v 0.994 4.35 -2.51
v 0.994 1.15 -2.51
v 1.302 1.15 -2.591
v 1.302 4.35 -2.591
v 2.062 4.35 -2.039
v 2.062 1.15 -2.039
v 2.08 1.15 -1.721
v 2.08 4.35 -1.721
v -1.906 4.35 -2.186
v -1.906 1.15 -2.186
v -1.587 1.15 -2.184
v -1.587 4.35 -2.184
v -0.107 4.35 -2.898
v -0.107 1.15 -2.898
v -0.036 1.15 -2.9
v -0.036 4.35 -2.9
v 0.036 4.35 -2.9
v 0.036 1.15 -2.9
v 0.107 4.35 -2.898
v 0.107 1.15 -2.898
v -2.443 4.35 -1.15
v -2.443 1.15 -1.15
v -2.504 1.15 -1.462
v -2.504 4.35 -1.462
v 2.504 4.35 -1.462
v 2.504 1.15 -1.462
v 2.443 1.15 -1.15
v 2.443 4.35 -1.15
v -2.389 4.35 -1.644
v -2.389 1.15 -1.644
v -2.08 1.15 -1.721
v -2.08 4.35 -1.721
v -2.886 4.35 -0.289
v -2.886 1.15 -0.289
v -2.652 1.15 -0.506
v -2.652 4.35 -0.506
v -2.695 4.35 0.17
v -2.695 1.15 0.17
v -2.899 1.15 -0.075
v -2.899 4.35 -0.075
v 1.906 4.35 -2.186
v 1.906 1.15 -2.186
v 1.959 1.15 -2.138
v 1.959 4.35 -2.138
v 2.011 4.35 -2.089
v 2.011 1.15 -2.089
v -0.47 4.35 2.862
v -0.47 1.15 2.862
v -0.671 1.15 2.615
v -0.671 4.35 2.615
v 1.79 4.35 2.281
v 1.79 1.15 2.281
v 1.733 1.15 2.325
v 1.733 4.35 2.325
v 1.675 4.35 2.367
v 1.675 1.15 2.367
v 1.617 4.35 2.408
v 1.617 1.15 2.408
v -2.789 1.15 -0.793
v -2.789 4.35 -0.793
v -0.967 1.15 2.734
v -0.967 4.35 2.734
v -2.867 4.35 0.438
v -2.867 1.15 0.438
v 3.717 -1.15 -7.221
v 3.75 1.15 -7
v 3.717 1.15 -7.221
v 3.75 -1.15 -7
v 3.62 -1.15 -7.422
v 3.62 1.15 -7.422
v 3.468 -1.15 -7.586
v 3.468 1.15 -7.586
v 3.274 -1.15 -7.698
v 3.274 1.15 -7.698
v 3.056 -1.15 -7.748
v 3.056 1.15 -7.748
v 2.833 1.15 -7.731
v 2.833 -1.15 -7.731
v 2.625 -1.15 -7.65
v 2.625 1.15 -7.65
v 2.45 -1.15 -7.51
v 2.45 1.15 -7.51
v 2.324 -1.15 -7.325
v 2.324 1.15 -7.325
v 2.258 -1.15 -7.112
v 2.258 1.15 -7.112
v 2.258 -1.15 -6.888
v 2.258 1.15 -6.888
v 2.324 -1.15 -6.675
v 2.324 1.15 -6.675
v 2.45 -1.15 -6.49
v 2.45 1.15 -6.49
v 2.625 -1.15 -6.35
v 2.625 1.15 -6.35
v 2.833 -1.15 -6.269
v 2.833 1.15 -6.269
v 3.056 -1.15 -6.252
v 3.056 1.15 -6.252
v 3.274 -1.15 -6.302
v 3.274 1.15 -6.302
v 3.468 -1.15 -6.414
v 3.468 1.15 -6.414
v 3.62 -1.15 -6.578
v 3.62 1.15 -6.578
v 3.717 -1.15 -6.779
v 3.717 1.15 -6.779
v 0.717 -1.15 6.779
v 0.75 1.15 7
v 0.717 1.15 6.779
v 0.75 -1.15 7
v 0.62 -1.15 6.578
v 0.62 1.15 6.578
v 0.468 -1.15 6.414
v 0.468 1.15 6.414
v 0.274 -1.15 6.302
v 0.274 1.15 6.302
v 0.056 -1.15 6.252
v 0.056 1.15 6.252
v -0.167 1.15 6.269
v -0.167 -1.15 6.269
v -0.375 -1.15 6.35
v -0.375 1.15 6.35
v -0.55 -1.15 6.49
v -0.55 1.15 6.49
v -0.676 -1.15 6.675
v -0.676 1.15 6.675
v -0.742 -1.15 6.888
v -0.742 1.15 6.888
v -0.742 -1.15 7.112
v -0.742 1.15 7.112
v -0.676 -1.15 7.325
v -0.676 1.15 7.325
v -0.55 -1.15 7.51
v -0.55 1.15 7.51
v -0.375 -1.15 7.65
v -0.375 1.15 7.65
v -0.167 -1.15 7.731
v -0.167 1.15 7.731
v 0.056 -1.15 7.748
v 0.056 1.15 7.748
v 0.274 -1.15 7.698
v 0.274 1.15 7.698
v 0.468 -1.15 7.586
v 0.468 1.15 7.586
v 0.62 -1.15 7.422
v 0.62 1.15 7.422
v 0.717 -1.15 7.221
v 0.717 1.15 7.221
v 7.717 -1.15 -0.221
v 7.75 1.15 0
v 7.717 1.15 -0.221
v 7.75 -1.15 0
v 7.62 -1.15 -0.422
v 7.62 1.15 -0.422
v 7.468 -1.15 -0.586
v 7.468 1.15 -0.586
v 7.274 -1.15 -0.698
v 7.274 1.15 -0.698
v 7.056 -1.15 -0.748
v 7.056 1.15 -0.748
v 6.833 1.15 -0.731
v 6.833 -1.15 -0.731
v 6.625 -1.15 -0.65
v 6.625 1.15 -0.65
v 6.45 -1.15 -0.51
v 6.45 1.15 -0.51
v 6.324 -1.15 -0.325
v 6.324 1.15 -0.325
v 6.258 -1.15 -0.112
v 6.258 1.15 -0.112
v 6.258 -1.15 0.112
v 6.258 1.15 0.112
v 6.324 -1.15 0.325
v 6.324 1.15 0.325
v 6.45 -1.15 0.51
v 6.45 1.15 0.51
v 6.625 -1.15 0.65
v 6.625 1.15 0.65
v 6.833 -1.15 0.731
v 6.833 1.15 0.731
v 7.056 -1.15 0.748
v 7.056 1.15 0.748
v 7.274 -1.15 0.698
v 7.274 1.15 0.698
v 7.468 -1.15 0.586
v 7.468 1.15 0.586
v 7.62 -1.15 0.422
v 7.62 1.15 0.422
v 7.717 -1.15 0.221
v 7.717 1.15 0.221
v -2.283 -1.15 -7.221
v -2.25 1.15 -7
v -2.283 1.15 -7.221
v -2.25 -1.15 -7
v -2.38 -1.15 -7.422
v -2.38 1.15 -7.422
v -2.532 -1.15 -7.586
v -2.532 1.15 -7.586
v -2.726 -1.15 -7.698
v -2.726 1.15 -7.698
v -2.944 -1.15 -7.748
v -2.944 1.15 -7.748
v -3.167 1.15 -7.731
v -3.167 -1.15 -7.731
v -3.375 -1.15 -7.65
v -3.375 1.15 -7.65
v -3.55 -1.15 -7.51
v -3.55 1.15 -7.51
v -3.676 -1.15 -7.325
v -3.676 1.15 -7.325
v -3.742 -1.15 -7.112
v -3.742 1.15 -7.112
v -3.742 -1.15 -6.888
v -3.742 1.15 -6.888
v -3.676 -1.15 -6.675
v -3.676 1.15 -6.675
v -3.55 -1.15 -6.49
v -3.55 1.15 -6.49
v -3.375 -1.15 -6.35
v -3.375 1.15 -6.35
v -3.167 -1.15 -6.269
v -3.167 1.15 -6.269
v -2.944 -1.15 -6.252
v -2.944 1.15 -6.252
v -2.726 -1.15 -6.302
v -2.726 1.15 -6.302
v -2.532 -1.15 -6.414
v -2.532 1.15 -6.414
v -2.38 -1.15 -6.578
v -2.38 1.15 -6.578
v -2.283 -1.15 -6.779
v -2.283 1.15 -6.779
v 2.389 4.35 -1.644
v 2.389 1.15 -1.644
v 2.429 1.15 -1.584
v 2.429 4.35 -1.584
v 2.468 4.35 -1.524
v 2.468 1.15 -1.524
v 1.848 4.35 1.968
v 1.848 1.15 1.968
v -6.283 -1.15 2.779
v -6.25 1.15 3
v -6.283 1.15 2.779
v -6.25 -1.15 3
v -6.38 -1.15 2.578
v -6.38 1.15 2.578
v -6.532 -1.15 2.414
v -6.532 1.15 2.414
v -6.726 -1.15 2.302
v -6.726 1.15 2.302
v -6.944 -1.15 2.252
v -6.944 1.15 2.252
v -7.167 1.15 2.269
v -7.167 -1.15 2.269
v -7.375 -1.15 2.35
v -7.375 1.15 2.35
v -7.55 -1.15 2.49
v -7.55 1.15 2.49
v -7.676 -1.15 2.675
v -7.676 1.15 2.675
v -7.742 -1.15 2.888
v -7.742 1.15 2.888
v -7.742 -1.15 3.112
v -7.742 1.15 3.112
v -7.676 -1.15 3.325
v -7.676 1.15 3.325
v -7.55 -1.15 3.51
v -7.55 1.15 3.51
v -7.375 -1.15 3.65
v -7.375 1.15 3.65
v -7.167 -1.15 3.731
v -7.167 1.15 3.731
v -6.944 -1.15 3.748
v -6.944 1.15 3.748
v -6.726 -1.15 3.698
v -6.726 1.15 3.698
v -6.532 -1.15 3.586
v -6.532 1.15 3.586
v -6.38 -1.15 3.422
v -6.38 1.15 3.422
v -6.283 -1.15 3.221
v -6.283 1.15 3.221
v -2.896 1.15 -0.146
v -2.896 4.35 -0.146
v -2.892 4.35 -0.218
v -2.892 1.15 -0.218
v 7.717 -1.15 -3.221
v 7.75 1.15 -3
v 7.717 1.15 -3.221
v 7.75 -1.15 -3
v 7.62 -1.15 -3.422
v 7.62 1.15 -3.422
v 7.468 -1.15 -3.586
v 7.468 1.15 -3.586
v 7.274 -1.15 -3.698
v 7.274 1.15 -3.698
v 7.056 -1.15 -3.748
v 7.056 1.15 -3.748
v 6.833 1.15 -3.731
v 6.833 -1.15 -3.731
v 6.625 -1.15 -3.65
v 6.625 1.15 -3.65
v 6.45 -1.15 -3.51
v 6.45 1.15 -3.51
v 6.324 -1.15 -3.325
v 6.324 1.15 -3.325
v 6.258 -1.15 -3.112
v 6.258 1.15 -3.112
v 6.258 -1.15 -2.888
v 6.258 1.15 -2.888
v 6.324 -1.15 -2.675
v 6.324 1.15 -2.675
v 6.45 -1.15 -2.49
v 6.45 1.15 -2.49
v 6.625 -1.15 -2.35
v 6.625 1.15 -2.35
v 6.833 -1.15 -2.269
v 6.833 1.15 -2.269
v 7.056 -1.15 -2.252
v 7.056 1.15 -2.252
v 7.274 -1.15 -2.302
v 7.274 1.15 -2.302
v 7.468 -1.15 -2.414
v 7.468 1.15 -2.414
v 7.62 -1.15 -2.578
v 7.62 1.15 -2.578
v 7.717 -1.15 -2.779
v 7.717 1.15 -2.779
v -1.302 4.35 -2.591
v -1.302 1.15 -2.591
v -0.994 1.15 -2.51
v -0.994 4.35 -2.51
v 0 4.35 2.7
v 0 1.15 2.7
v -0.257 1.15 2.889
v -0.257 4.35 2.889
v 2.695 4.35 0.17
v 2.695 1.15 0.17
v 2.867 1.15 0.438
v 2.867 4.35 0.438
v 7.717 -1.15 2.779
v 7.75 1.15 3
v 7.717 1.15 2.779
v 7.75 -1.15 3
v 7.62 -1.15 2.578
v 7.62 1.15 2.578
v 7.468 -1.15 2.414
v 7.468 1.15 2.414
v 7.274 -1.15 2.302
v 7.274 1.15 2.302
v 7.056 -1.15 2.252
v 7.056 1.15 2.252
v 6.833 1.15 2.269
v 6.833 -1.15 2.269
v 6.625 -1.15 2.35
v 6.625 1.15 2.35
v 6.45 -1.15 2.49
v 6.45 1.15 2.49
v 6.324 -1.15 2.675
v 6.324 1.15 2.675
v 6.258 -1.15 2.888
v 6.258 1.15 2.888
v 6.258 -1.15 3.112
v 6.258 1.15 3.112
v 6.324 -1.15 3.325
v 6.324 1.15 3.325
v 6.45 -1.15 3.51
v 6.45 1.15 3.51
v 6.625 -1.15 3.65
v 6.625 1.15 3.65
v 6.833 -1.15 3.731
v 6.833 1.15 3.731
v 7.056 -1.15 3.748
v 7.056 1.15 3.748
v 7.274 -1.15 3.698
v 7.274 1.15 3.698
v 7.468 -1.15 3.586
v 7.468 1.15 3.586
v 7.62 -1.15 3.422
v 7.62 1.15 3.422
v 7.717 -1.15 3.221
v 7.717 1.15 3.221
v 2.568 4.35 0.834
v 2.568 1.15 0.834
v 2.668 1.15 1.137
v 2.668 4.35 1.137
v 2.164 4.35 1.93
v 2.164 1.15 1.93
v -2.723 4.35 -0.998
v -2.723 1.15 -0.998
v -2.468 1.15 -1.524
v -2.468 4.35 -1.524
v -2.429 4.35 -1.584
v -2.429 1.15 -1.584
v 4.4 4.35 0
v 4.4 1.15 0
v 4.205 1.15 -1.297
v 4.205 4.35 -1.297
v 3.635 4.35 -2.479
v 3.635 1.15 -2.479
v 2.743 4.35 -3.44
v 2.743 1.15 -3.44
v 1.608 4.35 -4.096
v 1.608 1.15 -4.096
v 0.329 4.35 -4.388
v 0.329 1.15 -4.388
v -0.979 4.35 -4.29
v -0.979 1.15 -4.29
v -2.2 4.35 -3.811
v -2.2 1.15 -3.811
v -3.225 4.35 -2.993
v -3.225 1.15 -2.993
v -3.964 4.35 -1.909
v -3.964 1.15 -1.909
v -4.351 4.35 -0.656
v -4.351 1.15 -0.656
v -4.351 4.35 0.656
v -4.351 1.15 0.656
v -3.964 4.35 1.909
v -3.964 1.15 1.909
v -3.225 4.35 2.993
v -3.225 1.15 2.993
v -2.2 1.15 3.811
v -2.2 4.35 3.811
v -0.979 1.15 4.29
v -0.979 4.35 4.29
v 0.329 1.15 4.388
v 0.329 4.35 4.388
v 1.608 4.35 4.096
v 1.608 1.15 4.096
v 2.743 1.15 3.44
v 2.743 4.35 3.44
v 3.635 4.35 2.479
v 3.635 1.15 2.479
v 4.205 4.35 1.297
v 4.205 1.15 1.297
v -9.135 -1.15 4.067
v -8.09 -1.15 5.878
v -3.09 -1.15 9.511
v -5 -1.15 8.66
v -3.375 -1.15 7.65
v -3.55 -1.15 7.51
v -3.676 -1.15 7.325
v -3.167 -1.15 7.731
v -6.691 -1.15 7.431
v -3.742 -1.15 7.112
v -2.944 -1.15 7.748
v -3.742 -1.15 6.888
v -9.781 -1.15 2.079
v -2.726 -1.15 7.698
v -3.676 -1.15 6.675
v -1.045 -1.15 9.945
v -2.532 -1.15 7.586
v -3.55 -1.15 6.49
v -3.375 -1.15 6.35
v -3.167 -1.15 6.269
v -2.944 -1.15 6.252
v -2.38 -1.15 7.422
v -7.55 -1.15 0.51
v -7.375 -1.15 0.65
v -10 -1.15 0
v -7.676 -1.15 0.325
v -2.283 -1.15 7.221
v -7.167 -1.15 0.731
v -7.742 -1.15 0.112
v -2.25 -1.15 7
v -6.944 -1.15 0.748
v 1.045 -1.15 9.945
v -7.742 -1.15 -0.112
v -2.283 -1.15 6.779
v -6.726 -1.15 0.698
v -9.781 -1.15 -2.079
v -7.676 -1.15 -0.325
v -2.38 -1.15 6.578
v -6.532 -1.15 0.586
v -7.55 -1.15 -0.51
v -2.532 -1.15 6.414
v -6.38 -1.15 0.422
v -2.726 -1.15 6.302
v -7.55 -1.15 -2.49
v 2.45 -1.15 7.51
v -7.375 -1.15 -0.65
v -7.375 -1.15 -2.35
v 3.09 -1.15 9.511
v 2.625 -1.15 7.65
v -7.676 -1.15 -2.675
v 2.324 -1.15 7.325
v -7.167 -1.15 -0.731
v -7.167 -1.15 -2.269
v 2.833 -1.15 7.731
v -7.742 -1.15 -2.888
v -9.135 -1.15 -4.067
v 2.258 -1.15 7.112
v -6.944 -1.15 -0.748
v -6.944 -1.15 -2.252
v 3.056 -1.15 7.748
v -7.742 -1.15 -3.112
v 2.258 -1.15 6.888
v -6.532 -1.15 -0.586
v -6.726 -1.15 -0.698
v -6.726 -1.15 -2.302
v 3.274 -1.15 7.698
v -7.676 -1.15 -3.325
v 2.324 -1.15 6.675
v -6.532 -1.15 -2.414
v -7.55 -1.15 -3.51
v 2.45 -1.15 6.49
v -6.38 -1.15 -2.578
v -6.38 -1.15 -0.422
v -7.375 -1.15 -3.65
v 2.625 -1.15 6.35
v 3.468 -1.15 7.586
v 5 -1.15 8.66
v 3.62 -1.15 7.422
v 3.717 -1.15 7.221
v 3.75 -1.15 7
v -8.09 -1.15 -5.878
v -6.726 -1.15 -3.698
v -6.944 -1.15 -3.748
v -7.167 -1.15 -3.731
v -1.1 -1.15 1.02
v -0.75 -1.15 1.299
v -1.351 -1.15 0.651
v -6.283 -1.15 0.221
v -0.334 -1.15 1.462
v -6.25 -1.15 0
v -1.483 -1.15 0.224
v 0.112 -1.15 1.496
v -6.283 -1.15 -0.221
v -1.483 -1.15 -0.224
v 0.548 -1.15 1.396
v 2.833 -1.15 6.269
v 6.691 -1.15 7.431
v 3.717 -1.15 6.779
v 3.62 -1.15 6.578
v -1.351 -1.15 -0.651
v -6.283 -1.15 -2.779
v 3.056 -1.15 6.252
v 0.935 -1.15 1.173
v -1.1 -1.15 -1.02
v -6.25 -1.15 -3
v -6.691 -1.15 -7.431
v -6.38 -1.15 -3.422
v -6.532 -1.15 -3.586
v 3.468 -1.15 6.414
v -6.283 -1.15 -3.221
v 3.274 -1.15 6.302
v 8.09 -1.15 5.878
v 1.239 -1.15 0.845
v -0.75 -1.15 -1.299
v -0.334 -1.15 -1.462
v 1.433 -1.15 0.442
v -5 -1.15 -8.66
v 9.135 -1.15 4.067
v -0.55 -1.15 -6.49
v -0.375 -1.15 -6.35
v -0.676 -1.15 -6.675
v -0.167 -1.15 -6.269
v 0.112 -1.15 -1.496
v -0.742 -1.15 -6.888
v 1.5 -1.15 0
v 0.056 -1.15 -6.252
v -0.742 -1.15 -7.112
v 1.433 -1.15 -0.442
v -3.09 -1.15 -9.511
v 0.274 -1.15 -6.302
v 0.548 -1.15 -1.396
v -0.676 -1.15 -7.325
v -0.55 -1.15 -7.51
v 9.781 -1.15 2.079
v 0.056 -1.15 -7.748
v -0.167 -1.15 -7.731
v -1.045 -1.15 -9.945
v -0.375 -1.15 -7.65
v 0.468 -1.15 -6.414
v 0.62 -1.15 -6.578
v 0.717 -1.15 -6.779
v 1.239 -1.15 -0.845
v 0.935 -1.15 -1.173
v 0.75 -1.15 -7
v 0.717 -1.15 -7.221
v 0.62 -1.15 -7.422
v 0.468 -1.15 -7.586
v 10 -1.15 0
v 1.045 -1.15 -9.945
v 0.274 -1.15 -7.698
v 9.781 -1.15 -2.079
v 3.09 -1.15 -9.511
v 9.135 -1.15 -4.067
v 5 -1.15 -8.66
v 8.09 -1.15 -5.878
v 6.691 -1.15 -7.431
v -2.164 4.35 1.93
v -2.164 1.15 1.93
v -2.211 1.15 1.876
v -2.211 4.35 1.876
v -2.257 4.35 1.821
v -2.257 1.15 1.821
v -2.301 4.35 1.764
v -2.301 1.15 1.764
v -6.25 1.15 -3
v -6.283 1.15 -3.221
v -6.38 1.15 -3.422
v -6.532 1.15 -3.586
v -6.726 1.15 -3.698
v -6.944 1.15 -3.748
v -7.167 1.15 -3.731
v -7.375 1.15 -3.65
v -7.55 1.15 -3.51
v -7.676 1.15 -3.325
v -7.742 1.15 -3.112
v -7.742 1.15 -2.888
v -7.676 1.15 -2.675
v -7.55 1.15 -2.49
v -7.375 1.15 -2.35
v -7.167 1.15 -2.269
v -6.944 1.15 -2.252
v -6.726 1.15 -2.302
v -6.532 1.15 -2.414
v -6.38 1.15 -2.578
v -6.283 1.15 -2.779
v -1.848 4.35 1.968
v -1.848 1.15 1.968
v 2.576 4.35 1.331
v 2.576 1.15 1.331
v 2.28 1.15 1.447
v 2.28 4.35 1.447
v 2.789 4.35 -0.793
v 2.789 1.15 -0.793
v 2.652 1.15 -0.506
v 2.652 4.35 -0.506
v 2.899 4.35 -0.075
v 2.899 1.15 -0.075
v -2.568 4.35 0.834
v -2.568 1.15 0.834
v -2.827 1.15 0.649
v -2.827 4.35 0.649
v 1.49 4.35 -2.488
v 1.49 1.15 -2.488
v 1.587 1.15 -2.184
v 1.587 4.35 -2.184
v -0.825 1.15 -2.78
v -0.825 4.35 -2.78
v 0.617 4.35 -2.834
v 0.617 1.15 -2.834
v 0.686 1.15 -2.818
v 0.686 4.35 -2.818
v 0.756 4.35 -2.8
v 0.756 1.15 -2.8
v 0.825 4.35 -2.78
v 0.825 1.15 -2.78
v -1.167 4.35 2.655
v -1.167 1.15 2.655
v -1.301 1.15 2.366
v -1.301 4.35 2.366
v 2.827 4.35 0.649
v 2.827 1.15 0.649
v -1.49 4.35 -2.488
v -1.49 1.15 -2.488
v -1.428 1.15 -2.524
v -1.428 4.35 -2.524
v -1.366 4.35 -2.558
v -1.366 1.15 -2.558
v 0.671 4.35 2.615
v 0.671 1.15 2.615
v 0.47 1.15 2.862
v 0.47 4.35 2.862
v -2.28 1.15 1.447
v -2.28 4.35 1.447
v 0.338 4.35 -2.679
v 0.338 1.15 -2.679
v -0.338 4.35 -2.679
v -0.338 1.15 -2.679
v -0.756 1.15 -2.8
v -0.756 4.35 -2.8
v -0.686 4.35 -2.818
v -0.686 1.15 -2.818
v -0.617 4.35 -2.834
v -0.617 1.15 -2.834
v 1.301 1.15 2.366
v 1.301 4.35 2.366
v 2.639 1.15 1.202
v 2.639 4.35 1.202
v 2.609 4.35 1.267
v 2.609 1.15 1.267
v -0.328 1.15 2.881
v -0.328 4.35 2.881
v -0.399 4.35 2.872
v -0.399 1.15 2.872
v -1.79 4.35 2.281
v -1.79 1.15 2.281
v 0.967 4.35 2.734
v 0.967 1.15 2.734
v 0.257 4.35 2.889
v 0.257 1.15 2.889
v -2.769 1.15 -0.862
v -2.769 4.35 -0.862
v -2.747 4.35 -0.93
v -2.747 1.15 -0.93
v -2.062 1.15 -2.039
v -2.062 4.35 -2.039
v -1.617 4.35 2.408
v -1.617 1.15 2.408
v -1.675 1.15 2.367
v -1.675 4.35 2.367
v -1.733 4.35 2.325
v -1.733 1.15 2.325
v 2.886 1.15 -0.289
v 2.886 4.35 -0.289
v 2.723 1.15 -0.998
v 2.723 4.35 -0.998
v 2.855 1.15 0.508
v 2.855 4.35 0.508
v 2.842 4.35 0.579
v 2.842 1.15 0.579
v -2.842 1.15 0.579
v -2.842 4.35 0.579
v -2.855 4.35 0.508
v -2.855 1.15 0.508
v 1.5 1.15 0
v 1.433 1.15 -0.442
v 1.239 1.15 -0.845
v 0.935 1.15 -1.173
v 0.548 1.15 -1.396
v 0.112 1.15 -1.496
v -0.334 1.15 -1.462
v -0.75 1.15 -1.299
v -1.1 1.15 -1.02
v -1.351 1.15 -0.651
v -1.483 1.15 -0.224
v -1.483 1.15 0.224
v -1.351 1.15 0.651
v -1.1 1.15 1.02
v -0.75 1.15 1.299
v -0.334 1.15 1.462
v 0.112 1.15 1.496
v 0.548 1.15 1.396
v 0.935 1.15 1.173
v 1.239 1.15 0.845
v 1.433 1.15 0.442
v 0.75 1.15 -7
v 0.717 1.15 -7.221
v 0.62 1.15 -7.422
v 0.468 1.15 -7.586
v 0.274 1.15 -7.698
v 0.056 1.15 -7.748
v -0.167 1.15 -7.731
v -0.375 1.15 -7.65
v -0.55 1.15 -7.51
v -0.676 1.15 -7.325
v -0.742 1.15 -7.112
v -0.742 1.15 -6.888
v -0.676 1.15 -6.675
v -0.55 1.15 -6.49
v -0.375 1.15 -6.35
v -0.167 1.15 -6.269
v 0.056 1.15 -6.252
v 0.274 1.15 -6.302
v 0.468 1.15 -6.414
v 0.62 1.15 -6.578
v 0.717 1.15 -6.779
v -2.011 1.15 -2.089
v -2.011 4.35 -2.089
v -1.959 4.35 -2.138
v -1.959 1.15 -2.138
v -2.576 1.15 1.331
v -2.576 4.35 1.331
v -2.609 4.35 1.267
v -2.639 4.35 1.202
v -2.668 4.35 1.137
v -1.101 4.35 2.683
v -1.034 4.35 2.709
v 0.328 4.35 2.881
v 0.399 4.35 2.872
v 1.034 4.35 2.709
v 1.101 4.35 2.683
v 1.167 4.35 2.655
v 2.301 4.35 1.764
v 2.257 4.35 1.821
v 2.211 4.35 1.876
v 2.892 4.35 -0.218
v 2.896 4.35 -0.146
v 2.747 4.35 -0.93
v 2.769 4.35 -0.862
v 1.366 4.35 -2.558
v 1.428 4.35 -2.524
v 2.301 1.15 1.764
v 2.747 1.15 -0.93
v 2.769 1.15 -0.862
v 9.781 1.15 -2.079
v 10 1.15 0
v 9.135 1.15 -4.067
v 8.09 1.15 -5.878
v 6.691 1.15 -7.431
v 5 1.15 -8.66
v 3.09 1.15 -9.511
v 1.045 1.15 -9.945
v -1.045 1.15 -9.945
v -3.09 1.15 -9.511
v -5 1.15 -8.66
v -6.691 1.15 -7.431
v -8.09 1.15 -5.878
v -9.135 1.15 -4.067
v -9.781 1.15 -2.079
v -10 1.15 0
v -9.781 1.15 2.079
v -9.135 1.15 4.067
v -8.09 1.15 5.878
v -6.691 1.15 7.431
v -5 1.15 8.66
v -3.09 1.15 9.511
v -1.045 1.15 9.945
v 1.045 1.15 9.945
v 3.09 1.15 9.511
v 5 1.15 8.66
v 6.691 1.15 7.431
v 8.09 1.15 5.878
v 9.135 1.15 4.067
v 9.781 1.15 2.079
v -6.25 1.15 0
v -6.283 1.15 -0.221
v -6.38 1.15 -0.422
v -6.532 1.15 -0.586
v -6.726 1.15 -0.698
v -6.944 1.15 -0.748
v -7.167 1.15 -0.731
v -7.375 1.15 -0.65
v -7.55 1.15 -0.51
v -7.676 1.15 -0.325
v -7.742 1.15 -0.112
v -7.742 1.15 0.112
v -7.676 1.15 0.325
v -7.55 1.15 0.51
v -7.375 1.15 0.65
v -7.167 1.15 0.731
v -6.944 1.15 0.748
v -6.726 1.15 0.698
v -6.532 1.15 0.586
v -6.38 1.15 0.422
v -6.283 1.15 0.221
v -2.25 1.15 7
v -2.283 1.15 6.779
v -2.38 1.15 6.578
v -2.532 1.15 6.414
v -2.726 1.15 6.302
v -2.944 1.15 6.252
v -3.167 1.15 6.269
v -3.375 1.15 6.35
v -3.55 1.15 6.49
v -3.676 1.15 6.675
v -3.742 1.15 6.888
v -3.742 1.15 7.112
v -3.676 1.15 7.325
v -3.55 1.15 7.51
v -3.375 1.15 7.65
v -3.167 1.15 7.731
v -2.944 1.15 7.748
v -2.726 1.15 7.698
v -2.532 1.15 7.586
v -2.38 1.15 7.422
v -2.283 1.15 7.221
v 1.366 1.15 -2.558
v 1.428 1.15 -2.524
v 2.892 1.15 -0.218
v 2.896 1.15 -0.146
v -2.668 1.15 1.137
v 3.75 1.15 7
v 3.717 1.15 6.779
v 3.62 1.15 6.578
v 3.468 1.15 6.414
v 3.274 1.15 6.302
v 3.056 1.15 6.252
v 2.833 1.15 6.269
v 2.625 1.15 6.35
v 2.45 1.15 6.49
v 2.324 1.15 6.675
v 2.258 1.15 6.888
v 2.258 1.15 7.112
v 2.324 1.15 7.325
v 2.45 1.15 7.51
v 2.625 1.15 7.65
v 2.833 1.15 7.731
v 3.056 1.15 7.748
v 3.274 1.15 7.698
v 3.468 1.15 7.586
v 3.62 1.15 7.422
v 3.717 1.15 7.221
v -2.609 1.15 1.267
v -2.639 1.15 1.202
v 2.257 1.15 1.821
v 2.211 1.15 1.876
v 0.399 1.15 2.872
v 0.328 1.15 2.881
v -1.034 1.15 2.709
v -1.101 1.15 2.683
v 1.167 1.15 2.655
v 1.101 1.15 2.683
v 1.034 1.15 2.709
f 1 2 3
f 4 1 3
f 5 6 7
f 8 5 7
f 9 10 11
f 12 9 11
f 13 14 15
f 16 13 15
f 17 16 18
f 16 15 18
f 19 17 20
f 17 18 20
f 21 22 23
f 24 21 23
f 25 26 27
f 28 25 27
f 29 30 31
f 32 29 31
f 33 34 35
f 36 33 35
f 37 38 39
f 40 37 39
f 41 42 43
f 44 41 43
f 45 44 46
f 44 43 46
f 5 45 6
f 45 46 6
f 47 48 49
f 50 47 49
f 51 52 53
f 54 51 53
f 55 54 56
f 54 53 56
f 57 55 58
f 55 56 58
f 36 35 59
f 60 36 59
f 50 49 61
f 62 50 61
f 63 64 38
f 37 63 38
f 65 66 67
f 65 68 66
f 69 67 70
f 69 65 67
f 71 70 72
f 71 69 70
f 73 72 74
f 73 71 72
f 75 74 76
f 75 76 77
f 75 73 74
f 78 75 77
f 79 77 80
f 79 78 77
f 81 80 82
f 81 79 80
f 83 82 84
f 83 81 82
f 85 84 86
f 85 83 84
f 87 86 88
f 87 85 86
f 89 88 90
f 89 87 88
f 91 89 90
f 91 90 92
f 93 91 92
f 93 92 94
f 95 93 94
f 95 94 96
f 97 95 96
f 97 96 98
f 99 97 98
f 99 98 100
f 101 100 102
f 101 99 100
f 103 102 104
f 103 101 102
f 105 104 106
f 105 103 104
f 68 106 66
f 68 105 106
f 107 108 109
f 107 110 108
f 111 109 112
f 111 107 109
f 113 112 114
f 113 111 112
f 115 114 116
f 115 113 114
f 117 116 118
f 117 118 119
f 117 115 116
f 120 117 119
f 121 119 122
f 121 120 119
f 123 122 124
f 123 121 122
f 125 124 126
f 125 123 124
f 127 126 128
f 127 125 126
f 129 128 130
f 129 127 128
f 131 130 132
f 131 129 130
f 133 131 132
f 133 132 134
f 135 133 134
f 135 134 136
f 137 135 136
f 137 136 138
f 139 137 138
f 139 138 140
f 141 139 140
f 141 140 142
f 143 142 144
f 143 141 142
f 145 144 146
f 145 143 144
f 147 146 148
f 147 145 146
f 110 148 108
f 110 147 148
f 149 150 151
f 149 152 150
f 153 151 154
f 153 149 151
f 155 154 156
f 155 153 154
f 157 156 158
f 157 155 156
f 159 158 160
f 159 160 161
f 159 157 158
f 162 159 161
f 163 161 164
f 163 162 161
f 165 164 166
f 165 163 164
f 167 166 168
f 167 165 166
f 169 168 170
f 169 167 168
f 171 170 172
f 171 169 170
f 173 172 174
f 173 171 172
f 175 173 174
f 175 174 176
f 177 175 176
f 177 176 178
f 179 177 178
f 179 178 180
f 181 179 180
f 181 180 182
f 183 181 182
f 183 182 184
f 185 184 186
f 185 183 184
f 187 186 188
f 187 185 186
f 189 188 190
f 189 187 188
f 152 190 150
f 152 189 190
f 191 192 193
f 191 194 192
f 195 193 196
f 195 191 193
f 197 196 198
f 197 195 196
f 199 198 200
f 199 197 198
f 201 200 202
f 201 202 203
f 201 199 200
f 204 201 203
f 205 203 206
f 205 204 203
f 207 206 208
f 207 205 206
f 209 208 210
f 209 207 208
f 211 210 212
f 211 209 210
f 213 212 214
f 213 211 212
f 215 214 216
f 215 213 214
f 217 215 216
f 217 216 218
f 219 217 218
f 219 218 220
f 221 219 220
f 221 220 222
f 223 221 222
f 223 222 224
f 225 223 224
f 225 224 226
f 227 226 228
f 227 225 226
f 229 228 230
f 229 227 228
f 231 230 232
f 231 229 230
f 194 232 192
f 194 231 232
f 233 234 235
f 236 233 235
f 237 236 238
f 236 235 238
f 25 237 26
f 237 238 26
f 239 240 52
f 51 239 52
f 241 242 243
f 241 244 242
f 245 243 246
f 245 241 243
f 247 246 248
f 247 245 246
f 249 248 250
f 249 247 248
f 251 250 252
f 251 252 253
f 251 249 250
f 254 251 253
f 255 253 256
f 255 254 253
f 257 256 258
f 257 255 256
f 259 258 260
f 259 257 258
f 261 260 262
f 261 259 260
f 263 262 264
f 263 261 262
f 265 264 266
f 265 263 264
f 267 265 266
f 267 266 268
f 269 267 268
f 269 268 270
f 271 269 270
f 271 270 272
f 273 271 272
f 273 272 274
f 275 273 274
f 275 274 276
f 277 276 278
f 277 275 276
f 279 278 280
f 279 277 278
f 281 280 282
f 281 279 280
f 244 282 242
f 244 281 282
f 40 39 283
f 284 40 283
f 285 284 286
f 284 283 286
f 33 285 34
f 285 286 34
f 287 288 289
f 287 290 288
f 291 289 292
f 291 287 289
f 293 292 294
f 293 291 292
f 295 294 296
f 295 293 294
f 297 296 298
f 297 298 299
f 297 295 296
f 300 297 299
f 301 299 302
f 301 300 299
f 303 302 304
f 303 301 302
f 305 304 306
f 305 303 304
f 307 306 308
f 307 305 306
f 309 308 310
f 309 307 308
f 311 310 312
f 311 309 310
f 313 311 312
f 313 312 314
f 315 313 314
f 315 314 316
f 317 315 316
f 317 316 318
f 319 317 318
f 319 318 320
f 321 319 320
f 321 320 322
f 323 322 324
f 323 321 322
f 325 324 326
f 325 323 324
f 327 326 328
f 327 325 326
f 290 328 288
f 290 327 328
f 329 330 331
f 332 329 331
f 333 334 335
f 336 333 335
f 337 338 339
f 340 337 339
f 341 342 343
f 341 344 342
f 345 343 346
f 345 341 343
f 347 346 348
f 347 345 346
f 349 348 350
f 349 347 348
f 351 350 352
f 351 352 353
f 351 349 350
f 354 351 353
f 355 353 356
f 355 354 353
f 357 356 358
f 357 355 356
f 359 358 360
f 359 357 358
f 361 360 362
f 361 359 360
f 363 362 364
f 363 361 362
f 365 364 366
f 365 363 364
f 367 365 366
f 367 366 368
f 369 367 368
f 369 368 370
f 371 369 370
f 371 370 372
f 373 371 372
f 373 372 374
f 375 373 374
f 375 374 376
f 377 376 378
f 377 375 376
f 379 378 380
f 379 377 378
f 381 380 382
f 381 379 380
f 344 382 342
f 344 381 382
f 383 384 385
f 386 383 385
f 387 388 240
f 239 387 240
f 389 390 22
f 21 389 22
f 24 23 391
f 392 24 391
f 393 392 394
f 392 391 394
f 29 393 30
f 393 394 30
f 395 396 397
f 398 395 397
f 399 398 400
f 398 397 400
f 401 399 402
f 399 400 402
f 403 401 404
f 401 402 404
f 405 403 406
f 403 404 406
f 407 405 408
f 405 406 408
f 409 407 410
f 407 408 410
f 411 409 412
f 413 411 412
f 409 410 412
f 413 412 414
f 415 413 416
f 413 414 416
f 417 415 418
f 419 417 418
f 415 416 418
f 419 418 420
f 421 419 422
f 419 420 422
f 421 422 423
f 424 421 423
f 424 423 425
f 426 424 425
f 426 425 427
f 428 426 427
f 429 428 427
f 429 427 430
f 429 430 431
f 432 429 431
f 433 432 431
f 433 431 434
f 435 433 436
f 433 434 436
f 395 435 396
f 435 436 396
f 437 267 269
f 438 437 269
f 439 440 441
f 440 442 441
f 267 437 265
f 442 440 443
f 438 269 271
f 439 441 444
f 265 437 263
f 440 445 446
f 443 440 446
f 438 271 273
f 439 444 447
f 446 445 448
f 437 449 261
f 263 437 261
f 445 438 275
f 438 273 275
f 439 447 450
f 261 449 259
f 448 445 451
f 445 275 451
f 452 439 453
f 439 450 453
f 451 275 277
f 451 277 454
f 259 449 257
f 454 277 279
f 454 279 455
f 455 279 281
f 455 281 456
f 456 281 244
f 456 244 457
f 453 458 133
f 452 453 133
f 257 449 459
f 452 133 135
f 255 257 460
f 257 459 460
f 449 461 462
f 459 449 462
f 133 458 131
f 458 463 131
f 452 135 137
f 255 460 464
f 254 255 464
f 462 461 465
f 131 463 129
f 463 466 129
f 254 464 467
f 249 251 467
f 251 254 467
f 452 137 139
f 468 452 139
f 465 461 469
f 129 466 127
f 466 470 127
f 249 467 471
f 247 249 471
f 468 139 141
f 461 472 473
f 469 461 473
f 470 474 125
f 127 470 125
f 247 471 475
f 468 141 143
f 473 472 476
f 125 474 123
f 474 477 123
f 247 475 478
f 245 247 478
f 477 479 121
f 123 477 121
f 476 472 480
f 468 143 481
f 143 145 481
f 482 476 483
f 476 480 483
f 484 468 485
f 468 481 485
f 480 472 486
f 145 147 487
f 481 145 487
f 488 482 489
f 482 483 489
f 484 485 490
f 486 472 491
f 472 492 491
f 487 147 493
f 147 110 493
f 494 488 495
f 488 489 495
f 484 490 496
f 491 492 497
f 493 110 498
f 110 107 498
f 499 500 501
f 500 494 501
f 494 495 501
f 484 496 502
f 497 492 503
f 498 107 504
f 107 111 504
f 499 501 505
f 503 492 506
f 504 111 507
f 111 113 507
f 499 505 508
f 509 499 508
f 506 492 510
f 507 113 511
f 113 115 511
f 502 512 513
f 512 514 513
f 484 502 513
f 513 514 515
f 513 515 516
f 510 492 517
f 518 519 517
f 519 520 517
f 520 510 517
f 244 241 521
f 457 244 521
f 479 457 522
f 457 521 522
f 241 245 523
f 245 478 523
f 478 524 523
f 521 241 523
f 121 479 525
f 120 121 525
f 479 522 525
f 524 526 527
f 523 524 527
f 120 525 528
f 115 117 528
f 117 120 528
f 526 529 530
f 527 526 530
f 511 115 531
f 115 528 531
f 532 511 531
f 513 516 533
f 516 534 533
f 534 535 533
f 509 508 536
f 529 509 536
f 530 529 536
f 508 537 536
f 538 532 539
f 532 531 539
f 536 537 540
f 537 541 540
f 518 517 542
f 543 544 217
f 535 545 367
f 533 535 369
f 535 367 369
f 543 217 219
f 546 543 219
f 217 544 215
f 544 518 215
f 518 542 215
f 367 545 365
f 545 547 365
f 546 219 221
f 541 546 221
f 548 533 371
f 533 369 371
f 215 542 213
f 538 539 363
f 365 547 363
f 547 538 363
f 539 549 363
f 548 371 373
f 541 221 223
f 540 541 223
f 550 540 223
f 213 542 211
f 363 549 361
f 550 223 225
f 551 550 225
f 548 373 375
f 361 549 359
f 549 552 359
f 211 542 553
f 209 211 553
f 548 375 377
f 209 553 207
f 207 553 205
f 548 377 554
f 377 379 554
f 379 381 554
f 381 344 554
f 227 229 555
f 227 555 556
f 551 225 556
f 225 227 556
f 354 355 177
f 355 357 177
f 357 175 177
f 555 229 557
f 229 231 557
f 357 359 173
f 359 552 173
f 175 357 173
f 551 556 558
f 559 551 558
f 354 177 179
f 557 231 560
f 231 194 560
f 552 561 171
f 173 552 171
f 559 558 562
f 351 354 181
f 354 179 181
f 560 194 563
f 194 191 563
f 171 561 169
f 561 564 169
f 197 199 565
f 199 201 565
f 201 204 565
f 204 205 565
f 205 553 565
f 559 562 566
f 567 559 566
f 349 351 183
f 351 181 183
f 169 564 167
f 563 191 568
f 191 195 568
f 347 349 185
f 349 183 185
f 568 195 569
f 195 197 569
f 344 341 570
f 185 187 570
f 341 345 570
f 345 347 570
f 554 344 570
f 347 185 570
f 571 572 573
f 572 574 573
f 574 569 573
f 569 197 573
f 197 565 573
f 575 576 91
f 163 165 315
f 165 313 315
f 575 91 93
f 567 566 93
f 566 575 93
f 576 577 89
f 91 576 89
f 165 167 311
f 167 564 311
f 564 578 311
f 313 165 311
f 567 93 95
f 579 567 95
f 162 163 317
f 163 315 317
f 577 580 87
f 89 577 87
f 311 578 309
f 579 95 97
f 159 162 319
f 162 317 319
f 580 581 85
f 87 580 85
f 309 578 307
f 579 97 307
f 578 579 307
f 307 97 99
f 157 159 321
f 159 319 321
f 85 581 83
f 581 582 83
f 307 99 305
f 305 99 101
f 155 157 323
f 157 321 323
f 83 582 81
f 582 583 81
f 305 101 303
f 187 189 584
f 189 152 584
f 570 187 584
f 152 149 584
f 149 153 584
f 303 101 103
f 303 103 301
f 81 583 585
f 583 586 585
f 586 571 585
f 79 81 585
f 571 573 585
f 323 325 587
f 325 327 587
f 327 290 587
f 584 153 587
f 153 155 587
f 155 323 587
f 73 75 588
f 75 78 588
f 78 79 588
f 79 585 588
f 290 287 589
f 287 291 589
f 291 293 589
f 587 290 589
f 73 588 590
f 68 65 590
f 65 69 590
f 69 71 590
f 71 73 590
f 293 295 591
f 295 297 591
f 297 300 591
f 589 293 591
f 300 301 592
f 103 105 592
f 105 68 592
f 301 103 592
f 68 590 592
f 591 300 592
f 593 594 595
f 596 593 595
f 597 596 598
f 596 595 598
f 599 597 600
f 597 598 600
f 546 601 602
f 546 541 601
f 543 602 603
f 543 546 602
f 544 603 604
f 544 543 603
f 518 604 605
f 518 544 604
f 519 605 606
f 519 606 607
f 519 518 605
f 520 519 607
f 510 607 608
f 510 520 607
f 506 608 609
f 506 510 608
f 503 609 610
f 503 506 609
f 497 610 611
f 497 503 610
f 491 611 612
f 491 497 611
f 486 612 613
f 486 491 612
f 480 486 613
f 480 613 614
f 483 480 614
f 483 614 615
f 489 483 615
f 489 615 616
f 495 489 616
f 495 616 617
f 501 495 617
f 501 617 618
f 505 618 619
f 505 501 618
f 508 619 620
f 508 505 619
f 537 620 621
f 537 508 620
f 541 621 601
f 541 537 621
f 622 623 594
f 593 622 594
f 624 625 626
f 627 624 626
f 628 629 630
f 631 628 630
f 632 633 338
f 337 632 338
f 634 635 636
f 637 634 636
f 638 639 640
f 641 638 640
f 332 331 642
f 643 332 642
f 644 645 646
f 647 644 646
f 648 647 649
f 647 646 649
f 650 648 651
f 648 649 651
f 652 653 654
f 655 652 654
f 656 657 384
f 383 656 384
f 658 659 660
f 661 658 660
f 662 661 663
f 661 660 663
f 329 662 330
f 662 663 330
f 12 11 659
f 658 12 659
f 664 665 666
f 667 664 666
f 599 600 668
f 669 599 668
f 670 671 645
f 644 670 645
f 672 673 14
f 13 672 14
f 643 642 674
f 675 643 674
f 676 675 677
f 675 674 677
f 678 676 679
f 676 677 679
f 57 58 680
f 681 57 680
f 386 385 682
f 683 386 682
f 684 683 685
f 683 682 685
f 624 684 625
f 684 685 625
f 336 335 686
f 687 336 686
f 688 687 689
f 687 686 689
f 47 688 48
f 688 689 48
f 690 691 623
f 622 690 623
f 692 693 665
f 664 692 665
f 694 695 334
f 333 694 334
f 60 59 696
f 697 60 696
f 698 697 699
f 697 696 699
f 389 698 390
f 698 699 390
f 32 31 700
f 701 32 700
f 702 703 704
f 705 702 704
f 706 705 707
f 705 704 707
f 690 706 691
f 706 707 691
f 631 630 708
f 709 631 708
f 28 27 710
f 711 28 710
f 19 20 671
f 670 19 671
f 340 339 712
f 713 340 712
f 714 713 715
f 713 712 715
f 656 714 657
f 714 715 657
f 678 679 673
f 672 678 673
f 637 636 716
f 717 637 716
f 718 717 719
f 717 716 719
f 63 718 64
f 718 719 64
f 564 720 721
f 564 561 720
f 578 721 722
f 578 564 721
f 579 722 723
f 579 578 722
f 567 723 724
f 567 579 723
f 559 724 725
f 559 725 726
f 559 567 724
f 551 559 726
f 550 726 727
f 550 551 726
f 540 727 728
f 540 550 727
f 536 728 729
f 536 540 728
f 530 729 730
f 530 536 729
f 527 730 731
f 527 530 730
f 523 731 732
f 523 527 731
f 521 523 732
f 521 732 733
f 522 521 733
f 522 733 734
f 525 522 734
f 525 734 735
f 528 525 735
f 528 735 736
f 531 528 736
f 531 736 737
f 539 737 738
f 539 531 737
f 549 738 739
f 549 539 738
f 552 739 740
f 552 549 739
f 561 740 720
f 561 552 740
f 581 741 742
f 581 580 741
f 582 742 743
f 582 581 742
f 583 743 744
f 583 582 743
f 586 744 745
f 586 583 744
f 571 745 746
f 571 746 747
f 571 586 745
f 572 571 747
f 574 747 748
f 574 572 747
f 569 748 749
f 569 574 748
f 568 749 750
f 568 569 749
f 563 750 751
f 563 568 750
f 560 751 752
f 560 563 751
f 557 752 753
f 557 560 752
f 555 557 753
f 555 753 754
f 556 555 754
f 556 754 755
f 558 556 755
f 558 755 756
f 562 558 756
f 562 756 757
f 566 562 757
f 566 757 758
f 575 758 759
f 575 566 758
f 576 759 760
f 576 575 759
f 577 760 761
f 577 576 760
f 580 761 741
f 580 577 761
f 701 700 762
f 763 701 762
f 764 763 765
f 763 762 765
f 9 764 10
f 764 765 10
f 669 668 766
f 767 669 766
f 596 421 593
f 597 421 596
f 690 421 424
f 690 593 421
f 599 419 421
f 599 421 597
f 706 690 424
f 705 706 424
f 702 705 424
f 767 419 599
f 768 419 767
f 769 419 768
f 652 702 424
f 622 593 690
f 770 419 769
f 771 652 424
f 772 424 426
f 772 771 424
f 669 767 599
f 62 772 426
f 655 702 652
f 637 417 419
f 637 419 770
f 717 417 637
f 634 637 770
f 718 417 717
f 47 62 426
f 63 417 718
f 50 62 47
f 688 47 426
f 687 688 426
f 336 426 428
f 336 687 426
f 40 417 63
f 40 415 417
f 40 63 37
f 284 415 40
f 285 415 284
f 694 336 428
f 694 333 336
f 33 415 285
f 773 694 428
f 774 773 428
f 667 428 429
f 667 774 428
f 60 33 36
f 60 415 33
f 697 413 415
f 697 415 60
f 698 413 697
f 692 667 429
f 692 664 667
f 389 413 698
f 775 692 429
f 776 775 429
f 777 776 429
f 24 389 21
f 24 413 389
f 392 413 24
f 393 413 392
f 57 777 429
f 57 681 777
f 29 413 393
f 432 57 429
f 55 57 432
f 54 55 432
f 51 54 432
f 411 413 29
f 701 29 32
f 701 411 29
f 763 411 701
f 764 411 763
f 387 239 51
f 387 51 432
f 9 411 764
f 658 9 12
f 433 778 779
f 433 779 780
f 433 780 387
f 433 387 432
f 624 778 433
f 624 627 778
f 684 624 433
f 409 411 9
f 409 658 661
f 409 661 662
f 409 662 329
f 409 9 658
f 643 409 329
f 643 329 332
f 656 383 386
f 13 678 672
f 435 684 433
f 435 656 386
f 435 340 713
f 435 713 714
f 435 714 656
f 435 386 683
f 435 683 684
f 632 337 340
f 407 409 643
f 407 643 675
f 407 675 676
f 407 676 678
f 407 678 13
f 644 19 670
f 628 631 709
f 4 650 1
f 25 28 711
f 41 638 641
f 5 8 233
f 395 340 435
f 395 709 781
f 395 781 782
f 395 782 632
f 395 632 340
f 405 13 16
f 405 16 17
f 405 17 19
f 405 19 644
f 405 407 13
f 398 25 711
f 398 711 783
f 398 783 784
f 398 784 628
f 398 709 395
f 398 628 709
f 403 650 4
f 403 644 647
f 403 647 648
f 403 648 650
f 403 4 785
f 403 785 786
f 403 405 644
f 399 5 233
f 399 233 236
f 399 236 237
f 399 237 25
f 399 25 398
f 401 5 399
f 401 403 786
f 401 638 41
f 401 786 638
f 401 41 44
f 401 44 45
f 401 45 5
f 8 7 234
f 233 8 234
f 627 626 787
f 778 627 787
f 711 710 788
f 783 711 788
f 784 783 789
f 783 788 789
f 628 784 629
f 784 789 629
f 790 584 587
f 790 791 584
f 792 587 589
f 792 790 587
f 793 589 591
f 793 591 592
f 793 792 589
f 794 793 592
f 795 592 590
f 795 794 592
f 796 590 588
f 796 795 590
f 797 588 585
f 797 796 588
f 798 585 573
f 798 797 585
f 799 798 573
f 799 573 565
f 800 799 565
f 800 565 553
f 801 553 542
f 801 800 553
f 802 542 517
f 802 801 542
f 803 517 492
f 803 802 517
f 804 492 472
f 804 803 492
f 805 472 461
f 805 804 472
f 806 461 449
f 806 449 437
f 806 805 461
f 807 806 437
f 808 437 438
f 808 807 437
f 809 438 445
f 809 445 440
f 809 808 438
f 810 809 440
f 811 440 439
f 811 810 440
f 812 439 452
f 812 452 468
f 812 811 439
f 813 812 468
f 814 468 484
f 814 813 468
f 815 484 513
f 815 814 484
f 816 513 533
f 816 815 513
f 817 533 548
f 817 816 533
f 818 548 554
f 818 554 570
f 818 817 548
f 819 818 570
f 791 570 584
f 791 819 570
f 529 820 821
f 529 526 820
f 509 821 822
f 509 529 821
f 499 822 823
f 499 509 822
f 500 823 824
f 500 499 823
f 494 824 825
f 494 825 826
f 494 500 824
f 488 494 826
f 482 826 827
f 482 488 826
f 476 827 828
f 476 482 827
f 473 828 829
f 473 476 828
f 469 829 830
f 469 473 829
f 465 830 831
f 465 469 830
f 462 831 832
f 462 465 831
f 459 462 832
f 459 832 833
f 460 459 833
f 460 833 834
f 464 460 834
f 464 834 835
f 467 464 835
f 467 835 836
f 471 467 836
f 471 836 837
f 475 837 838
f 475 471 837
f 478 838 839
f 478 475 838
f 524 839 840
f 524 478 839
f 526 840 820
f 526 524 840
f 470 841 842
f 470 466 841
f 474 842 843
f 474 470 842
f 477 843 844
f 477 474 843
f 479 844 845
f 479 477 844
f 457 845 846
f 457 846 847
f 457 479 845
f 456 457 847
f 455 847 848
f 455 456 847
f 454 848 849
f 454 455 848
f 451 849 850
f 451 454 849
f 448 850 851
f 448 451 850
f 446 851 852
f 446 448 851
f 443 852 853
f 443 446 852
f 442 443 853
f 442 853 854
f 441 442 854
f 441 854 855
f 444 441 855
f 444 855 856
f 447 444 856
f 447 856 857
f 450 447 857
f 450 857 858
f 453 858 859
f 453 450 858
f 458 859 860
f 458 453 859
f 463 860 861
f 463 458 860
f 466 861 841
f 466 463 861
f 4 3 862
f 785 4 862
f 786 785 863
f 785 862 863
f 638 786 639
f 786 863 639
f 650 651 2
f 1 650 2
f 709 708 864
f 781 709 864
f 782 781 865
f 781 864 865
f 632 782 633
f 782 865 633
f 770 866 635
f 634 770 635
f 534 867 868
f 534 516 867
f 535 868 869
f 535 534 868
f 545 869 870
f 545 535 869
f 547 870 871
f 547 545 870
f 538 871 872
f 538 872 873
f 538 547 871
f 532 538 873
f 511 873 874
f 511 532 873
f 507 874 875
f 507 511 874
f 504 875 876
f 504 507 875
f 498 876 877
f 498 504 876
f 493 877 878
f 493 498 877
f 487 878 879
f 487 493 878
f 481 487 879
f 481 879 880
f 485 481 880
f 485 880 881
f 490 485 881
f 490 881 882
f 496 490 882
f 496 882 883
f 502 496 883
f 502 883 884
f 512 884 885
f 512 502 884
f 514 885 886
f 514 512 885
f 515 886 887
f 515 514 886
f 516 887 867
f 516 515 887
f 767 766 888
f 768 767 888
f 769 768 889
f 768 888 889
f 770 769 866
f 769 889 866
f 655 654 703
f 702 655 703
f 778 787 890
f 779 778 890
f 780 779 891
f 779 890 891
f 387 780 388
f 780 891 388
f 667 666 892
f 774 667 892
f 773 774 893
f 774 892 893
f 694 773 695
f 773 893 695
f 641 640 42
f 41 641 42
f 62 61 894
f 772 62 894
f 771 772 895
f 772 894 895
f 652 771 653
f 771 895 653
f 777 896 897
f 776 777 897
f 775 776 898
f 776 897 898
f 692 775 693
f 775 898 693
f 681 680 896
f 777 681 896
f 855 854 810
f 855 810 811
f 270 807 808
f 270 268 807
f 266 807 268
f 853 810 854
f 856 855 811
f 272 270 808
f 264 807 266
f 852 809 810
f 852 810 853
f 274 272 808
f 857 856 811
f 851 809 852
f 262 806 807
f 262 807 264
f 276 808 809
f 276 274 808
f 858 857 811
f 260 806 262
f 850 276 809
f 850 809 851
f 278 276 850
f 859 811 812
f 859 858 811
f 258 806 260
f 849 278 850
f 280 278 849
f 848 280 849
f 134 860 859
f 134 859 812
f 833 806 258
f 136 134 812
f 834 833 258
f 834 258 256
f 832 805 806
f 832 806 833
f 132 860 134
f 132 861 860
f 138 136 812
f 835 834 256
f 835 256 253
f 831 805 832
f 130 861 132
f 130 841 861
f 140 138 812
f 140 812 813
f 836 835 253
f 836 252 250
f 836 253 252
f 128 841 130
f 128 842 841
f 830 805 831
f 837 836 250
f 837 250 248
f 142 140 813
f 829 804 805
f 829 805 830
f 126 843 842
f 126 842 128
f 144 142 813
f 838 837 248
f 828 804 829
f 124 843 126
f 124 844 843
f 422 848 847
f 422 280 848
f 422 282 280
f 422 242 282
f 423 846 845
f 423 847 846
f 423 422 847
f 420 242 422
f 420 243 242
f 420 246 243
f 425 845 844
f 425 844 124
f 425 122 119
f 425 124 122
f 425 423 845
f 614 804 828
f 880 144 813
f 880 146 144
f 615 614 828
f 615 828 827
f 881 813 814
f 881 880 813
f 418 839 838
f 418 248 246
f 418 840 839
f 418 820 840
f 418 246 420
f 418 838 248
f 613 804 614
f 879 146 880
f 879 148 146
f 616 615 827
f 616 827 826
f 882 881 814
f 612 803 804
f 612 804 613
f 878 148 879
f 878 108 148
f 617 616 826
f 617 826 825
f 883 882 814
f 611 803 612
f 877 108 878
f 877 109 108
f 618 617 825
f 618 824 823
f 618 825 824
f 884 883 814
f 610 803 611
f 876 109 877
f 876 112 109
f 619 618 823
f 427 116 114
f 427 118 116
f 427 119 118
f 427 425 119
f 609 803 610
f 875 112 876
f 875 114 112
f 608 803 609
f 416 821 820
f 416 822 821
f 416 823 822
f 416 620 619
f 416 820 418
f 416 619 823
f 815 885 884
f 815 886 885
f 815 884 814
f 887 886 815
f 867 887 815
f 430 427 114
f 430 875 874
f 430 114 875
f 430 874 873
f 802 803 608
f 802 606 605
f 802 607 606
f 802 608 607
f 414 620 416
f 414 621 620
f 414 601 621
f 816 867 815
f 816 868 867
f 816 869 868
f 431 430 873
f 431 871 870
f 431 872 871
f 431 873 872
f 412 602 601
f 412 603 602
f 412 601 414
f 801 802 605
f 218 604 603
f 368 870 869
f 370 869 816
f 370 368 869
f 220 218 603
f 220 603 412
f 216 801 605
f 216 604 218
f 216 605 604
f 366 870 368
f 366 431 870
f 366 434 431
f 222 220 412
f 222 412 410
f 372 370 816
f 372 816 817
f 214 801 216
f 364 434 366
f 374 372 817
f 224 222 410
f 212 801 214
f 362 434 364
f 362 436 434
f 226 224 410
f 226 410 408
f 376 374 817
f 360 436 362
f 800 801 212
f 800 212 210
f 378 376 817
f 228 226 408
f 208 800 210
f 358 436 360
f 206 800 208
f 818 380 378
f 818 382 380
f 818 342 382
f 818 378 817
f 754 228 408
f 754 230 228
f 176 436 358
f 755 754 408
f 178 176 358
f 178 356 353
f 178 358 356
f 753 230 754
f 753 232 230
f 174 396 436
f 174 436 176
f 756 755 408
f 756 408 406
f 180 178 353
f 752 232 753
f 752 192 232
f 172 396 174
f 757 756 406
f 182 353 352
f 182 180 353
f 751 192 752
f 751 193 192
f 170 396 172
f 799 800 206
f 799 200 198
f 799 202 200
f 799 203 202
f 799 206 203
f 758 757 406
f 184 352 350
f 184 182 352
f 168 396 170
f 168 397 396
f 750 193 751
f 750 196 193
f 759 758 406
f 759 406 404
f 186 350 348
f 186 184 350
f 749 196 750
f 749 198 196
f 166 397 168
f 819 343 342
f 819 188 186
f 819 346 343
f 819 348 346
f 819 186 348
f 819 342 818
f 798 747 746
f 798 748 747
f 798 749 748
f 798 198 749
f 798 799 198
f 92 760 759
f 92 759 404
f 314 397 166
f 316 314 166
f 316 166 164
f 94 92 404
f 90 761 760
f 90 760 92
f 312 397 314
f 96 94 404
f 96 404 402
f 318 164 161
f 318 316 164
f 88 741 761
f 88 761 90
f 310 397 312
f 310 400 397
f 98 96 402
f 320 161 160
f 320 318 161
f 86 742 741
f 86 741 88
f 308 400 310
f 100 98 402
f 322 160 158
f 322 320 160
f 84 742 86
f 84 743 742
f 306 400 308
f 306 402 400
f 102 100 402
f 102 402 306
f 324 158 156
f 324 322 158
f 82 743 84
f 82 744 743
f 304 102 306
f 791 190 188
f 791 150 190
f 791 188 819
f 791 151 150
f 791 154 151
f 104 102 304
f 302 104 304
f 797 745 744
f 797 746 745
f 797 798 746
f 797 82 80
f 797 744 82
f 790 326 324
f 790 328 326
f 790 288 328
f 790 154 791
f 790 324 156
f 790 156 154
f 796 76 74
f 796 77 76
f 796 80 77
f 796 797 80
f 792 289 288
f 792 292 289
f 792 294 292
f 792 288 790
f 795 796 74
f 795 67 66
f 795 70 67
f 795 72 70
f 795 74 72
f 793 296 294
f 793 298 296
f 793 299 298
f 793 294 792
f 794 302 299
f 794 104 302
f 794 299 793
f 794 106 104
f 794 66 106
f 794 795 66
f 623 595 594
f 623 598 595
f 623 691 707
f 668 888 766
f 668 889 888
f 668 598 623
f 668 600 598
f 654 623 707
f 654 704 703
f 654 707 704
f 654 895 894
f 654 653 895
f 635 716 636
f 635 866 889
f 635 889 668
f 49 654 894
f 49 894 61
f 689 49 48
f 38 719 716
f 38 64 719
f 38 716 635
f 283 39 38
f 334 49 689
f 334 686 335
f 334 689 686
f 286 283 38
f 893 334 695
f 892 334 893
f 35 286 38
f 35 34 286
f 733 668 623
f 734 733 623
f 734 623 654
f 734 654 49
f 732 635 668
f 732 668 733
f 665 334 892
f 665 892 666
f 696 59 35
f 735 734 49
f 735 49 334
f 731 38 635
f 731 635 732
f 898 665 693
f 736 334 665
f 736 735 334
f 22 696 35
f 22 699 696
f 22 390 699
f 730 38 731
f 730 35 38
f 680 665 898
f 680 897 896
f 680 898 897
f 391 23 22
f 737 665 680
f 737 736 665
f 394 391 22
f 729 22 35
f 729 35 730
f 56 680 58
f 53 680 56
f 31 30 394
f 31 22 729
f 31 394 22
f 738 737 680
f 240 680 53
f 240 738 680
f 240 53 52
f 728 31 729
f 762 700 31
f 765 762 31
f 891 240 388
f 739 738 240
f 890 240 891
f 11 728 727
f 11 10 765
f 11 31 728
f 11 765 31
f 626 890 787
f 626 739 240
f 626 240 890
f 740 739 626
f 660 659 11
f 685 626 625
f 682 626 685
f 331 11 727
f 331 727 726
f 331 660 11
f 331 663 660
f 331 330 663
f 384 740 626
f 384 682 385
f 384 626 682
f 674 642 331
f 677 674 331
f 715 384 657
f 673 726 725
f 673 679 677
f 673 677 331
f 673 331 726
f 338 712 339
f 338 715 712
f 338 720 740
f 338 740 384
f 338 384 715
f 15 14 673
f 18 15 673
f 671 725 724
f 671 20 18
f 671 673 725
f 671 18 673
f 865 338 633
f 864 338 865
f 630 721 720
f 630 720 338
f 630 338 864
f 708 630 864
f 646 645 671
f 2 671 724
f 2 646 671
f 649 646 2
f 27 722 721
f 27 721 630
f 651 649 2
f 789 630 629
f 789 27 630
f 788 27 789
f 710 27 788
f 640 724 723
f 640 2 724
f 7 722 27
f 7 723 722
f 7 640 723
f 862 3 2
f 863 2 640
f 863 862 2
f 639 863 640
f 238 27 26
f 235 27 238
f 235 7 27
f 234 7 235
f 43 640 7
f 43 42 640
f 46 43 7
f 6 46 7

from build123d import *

# Parameters (mm, degrees)
SKETCH2_R           = 6
SKETCH2_R_2         = 1.5
BOSS_EXTRUDE1_DEPTH = 1.15
SKETCH3_R           = 4.4
BOSS_EXTRUDE2_DEPTH = 3.2
SKETCH5_R           = 10
SKETCH5_R_2         = 0.75
SKETCH5_R_3         = 1.5
BOSS_EXTRUDE4_DEPTH = 1.15


with BuildPart() as part:
    # Sketch2 → Boss-Extrude1 (new body, symmetric)
    with BuildSketch(Plane(origin=(0, 0, 0), x_dir=(1, 0, 0), z_dir=(0, 1, 0))):
        Circle(SKETCH2_R)
        Circle(SKETCH2_R_2, mode=Mode.SUBTRACT)
    extrude(amount=BOSS_EXTRUDE1_DEPTH, both=True)

    # Sketch3 → Boss-Extrude2 (add)
    with BuildSketch(Plane(origin=(0, 1.15, 0), x_dir=(1, 0, 0), z_dir=(0, 1, 0))):
        Circle(SKETCH3_R)
        with BuildLine():
            Line((0.107421435, 2.898009771), (0.338399731, 2.678709694))
            Line((0.338399731, 2.678709694), (0.61665913, 2.83367809))
            ThreePointArc((0.61665913, 2.83367809), (0.721200673, 2.808891167), (0.824752316, 2.780248841))
            Line((0.824752316, 2.780248841), (0.993936292, 2.510396512))
            Line((0.993936292, 2.510396512), (1.301992734, 2.591295993))
            ThreePointArc((1.301992734, 2.591295993), (1.397085655, 2.541289372), (1.490260976, 2.48779465))
            Line((1.490260976, 2.48779465), (1.587020181, 2.184345885))
            Line((1.587020181, 2.184345885), (1.905517346, 2.186093238))
            ThreePointArc((1.905517346, 2.186093238), (1.985186607, 2.11400902), (2.062131058, 2.039023173))
            Line((2.062131058, 2.039023173), (2.080385755, 1.721044772))
            Line((2.080385755, 1.721044772), (2.389311295, 1.643530205))
            ThreePointArc((2.389311295, 1.643530205), (2.448550984, 1.553897705), (2.504429862, 1.46213237))
            Line((2.504429862, 1.46213237), (2.443033042, 1.149604087))
            Line((2.443033042, 1.149604087), (2.722976028, 0.997698125))
            ThreePointArc((2.722976028, 0.997698125), (2.758063897, 0.896149284), (2.789366126, 0.793370413))
            Line((2.789366126, 0.793370413), (2.652175577, 0.505929549))
            Line((2.652175577, 0.505929549), (2.885546163, 0.289177003))
            ThreePointArc((2.885546163, 0.289177003), (2.894277512, 0.182092507), (2.899036259, 0.074758075))
            Line((2.899036259, 0.074758075), (2.694672167, -0.169534403))
            Line((2.694672167, -0.169534403), (2.866806821, -0.437514174))
            ThreePointArc((2.866806821, -0.437514174), (2.848633027, -0.543405812), (2.826549281, -0.648551587))
            Line((2.826549281, -0.648551587), (2.567852594, -0.834345885))
            Line((2.567852594, -0.834345885), (2.667935462, -1.136714727))
            ThreePointArc((2.667935462, -1.136714727), (2.623998452, -1.234759946), (2.576459817, -1.331110368))
            Line((2.576459817, -1.331110368), (2.279685399, -1.446732346))
            Line((2.279685399, -1.446732346), (2.301427906, -1.764491312))
            ThreePointArc((2.301427906, -1.764491312), (2.234488404, -1.84852957), (2.164481907, -1.930030589))
            Line((2.164481907, -1.930030589), (1.848277186, -1.968215294))
            Line((1.848277186, -1.968215294), (1.790313171, -2.281398419))
            ThreePointArc((1.790313171, -2.281398419), (1.704577232, -2.346149284), (1.616501638, -2.40767989))
            Line((1.616501638, -2.40767989), (1.30073492, -2.366028036))
            Line((1.30073492, -2.366028036), (1.166706475, -2.654956874))
            ThreePointArc((1.166706475, -2.654956874), (1.067561203, -2.696351809), (0.966950626, -2.734045809))
            Line((0.966950626, -2.734045809), (0.671462695, -2.615174535))
            Line((0.671462695, -2.615174535), (0.469791321, -2.861694623))
            ThreePointArc((0.469791321, -2.861694623), (0.363466377, -2.877132634), (0.25664255, -2.888621575))
            Line((0.25664255, -2.888621575), (0, -2.7))
            Line((0, -2.7), (-0.25664255, -2.888621575))
            ThreePointArc((-0.25664255, -2.888621575), (-0.363466377, -2.877132634), (-0.469791321, -2.861694623))
            Line((-0.469791321, -2.861694623), (-0.671462695, -2.615174535))
            Line((-0.671462695, -2.615174535), (-0.966950626, -2.734045809))
            ThreePointArc((-0.966950626, -2.734045809), (-1.067561203, -2.696351809), (-1.166706475, -2.654956874))
            Line((-1.166706475, -2.654956874), (-1.30073492, -2.366028036))
            Line((-1.30073492, -2.366028036), (-1.616501638, -2.40767989))
            ThreePointArc((-1.616501638, -2.40767989), (-1.704577232, -2.346149284), (-1.790313171, -2.281398419))
            Line((-1.790313171, -2.281398419), (-1.848277186, -1.968215294))
            Line((-1.848277186, -1.968215294), (-2.164481907, -1.930030589))
            ThreePointArc((-2.164481907, -1.930030589), (-2.234488404, -1.84852957), (-2.301427906, -1.764491312))
            Line((-2.301427906, -1.764491312), (-2.279685399, -1.446732346))
            Line((-2.279685399, -1.446732346), (-2.576459817, -1.331110368))
            ThreePointArc((-2.576459817, -1.331110368), (-2.623998452, -1.234759946), (-2.667935462, -1.136714727))
            Line((-2.667935462, -1.136714727), (-2.567852594, -0.834345885))
            Line((-2.567852594, -0.834345885), (-2.826549281, -0.648551587))
            ThreePointArc((-2.826549281, -0.648551587), (-2.848633027, -0.543405812), (-2.866806821, -0.437514174))
            Line((-2.866806821, -0.437514174), (-2.694672167, -0.169534403))
            Line((-2.694672167, -0.169534403), (-2.899036259, 0.074758075))
            ThreePointArc((-2.899036259, 0.074758075), (-2.894277512, 0.182092507), (-2.885546163, 0.289177003))
            Line((-2.885546163, 0.289177003), (-2.652175577, 0.505929549))
            Line((-2.652175577, 0.505929549), (-2.789366126, 0.793370413))
            ThreePointArc((-2.789366126, 0.793370413), (-2.758063897, 0.896149284), (-2.722976028, 0.997698125))
            Line((-2.722976028, 0.997698125), (-2.443033042, 1.149604087))
            Line((-2.443033042, 1.149604087), (-2.504429862, 1.46213237))
            ThreePointArc((-2.504429862, 1.46213237), (-2.448550984, 1.553897705), (-2.389311295, 1.643530205))
            Line((-2.389311295, 1.643530205), (-2.080385755, 1.721044772))
            Line((-2.080385755, 1.721044772), (-2.062131058, 2.039023173))
            ThreePointArc((-2.062131058, 2.039023173), (-1.985186607, 2.11400902), (-1.905517346, 2.186093238))
            Line((-1.905517346, 2.186093238), (-1.587020181, 2.184345885))
            Line((-1.587020181, 2.184345885), (-1.490260976, 2.48779465))
            ThreePointArc((-1.490260976, 2.48779465), (-1.397085655, 2.541289372), (-1.301992734, 2.591295993))
            Line((-1.301992734, 2.591295993), (-0.993936292, 2.510396512))
            Line((-0.993936292, 2.510396512), (-0.824752316, 2.780248841))
            ThreePointArc((-0.824752316, 2.780248841), (-0.721200673, 2.808891167), (-0.61665913, 2.83367809))
            Line((-0.61665913, 2.83367809), (-0.338399731, 2.678709694))
            Line((-0.338399731, 2.678709694), (-0.107421435, 2.898009771))
            ThreePointArc((-0.107421435, 2.898009771), (0, 2.9), (0.107421435, 2.898009771))
        make_face(mode=Mode.SUBTRACT)
    extrude(amount=BOSS_EXTRUDE2_DEPTH)

    # Sketch5 → Boss-Extrude4 (add, symmetric)
    with BuildSketch(Plane(origin=(0, 0, 0), x_dir=(1, 0, 0), z_dir=(0, 1, 0))):
        Circle(SKETCH5_R)
        with Locations((0, 7)):
            Circle(SKETCH5_R_2, mode=Mode.SUBTRACT)
        with Locations((-3, 7)):
            Circle(SKETCH5_R_2, mode=Mode.SUBTRACT)
        with Locations((3, 7)):
            Circle(SKETCH5_R_2, mode=Mode.SUBTRACT)
        with Locations((7, 3)):
            Circle(SKETCH5_R_2, mode=Mode.SUBTRACT)
        with Locations((7, 0)):
            Circle(SKETCH5_R_2, mode=Mode.SUBTRACT)
        with Locations((7, -3)):
            Circle(SKETCH5_R_2, mode=Mode.SUBTRACT)
        with Locations((3, -7)):
            Circle(SKETCH5_R_2, mode=Mode.SUBTRACT)
        with Locations((0, -7)):
            Circle(SKETCH5_R_2, mode=Mode.SUBTRACT)
        with Locations((-3, -7)):
            Circle(SKETCH5_R_2, mode=Mode.SUBTRACT)
        with Locations((-7, -3)):
            Circle(SKETCH5_R_2, mode=Mode.SUBTRACT)
        with Locations((-7, 0)):
            Circle(SKETCH5_R_2, mode=Mode.SUBTRACT)
        with Locations((-7, 3)):
            Circle(SKETCH5_R_2, mode=Mode.SUBTRACT)
        Circle(SKETCH5_R_3, mode=Mode.SUBTRACT)
    extrude(amount=BOSS_EXTRUDE4_DEPTH, both=True)


solid = part.part
